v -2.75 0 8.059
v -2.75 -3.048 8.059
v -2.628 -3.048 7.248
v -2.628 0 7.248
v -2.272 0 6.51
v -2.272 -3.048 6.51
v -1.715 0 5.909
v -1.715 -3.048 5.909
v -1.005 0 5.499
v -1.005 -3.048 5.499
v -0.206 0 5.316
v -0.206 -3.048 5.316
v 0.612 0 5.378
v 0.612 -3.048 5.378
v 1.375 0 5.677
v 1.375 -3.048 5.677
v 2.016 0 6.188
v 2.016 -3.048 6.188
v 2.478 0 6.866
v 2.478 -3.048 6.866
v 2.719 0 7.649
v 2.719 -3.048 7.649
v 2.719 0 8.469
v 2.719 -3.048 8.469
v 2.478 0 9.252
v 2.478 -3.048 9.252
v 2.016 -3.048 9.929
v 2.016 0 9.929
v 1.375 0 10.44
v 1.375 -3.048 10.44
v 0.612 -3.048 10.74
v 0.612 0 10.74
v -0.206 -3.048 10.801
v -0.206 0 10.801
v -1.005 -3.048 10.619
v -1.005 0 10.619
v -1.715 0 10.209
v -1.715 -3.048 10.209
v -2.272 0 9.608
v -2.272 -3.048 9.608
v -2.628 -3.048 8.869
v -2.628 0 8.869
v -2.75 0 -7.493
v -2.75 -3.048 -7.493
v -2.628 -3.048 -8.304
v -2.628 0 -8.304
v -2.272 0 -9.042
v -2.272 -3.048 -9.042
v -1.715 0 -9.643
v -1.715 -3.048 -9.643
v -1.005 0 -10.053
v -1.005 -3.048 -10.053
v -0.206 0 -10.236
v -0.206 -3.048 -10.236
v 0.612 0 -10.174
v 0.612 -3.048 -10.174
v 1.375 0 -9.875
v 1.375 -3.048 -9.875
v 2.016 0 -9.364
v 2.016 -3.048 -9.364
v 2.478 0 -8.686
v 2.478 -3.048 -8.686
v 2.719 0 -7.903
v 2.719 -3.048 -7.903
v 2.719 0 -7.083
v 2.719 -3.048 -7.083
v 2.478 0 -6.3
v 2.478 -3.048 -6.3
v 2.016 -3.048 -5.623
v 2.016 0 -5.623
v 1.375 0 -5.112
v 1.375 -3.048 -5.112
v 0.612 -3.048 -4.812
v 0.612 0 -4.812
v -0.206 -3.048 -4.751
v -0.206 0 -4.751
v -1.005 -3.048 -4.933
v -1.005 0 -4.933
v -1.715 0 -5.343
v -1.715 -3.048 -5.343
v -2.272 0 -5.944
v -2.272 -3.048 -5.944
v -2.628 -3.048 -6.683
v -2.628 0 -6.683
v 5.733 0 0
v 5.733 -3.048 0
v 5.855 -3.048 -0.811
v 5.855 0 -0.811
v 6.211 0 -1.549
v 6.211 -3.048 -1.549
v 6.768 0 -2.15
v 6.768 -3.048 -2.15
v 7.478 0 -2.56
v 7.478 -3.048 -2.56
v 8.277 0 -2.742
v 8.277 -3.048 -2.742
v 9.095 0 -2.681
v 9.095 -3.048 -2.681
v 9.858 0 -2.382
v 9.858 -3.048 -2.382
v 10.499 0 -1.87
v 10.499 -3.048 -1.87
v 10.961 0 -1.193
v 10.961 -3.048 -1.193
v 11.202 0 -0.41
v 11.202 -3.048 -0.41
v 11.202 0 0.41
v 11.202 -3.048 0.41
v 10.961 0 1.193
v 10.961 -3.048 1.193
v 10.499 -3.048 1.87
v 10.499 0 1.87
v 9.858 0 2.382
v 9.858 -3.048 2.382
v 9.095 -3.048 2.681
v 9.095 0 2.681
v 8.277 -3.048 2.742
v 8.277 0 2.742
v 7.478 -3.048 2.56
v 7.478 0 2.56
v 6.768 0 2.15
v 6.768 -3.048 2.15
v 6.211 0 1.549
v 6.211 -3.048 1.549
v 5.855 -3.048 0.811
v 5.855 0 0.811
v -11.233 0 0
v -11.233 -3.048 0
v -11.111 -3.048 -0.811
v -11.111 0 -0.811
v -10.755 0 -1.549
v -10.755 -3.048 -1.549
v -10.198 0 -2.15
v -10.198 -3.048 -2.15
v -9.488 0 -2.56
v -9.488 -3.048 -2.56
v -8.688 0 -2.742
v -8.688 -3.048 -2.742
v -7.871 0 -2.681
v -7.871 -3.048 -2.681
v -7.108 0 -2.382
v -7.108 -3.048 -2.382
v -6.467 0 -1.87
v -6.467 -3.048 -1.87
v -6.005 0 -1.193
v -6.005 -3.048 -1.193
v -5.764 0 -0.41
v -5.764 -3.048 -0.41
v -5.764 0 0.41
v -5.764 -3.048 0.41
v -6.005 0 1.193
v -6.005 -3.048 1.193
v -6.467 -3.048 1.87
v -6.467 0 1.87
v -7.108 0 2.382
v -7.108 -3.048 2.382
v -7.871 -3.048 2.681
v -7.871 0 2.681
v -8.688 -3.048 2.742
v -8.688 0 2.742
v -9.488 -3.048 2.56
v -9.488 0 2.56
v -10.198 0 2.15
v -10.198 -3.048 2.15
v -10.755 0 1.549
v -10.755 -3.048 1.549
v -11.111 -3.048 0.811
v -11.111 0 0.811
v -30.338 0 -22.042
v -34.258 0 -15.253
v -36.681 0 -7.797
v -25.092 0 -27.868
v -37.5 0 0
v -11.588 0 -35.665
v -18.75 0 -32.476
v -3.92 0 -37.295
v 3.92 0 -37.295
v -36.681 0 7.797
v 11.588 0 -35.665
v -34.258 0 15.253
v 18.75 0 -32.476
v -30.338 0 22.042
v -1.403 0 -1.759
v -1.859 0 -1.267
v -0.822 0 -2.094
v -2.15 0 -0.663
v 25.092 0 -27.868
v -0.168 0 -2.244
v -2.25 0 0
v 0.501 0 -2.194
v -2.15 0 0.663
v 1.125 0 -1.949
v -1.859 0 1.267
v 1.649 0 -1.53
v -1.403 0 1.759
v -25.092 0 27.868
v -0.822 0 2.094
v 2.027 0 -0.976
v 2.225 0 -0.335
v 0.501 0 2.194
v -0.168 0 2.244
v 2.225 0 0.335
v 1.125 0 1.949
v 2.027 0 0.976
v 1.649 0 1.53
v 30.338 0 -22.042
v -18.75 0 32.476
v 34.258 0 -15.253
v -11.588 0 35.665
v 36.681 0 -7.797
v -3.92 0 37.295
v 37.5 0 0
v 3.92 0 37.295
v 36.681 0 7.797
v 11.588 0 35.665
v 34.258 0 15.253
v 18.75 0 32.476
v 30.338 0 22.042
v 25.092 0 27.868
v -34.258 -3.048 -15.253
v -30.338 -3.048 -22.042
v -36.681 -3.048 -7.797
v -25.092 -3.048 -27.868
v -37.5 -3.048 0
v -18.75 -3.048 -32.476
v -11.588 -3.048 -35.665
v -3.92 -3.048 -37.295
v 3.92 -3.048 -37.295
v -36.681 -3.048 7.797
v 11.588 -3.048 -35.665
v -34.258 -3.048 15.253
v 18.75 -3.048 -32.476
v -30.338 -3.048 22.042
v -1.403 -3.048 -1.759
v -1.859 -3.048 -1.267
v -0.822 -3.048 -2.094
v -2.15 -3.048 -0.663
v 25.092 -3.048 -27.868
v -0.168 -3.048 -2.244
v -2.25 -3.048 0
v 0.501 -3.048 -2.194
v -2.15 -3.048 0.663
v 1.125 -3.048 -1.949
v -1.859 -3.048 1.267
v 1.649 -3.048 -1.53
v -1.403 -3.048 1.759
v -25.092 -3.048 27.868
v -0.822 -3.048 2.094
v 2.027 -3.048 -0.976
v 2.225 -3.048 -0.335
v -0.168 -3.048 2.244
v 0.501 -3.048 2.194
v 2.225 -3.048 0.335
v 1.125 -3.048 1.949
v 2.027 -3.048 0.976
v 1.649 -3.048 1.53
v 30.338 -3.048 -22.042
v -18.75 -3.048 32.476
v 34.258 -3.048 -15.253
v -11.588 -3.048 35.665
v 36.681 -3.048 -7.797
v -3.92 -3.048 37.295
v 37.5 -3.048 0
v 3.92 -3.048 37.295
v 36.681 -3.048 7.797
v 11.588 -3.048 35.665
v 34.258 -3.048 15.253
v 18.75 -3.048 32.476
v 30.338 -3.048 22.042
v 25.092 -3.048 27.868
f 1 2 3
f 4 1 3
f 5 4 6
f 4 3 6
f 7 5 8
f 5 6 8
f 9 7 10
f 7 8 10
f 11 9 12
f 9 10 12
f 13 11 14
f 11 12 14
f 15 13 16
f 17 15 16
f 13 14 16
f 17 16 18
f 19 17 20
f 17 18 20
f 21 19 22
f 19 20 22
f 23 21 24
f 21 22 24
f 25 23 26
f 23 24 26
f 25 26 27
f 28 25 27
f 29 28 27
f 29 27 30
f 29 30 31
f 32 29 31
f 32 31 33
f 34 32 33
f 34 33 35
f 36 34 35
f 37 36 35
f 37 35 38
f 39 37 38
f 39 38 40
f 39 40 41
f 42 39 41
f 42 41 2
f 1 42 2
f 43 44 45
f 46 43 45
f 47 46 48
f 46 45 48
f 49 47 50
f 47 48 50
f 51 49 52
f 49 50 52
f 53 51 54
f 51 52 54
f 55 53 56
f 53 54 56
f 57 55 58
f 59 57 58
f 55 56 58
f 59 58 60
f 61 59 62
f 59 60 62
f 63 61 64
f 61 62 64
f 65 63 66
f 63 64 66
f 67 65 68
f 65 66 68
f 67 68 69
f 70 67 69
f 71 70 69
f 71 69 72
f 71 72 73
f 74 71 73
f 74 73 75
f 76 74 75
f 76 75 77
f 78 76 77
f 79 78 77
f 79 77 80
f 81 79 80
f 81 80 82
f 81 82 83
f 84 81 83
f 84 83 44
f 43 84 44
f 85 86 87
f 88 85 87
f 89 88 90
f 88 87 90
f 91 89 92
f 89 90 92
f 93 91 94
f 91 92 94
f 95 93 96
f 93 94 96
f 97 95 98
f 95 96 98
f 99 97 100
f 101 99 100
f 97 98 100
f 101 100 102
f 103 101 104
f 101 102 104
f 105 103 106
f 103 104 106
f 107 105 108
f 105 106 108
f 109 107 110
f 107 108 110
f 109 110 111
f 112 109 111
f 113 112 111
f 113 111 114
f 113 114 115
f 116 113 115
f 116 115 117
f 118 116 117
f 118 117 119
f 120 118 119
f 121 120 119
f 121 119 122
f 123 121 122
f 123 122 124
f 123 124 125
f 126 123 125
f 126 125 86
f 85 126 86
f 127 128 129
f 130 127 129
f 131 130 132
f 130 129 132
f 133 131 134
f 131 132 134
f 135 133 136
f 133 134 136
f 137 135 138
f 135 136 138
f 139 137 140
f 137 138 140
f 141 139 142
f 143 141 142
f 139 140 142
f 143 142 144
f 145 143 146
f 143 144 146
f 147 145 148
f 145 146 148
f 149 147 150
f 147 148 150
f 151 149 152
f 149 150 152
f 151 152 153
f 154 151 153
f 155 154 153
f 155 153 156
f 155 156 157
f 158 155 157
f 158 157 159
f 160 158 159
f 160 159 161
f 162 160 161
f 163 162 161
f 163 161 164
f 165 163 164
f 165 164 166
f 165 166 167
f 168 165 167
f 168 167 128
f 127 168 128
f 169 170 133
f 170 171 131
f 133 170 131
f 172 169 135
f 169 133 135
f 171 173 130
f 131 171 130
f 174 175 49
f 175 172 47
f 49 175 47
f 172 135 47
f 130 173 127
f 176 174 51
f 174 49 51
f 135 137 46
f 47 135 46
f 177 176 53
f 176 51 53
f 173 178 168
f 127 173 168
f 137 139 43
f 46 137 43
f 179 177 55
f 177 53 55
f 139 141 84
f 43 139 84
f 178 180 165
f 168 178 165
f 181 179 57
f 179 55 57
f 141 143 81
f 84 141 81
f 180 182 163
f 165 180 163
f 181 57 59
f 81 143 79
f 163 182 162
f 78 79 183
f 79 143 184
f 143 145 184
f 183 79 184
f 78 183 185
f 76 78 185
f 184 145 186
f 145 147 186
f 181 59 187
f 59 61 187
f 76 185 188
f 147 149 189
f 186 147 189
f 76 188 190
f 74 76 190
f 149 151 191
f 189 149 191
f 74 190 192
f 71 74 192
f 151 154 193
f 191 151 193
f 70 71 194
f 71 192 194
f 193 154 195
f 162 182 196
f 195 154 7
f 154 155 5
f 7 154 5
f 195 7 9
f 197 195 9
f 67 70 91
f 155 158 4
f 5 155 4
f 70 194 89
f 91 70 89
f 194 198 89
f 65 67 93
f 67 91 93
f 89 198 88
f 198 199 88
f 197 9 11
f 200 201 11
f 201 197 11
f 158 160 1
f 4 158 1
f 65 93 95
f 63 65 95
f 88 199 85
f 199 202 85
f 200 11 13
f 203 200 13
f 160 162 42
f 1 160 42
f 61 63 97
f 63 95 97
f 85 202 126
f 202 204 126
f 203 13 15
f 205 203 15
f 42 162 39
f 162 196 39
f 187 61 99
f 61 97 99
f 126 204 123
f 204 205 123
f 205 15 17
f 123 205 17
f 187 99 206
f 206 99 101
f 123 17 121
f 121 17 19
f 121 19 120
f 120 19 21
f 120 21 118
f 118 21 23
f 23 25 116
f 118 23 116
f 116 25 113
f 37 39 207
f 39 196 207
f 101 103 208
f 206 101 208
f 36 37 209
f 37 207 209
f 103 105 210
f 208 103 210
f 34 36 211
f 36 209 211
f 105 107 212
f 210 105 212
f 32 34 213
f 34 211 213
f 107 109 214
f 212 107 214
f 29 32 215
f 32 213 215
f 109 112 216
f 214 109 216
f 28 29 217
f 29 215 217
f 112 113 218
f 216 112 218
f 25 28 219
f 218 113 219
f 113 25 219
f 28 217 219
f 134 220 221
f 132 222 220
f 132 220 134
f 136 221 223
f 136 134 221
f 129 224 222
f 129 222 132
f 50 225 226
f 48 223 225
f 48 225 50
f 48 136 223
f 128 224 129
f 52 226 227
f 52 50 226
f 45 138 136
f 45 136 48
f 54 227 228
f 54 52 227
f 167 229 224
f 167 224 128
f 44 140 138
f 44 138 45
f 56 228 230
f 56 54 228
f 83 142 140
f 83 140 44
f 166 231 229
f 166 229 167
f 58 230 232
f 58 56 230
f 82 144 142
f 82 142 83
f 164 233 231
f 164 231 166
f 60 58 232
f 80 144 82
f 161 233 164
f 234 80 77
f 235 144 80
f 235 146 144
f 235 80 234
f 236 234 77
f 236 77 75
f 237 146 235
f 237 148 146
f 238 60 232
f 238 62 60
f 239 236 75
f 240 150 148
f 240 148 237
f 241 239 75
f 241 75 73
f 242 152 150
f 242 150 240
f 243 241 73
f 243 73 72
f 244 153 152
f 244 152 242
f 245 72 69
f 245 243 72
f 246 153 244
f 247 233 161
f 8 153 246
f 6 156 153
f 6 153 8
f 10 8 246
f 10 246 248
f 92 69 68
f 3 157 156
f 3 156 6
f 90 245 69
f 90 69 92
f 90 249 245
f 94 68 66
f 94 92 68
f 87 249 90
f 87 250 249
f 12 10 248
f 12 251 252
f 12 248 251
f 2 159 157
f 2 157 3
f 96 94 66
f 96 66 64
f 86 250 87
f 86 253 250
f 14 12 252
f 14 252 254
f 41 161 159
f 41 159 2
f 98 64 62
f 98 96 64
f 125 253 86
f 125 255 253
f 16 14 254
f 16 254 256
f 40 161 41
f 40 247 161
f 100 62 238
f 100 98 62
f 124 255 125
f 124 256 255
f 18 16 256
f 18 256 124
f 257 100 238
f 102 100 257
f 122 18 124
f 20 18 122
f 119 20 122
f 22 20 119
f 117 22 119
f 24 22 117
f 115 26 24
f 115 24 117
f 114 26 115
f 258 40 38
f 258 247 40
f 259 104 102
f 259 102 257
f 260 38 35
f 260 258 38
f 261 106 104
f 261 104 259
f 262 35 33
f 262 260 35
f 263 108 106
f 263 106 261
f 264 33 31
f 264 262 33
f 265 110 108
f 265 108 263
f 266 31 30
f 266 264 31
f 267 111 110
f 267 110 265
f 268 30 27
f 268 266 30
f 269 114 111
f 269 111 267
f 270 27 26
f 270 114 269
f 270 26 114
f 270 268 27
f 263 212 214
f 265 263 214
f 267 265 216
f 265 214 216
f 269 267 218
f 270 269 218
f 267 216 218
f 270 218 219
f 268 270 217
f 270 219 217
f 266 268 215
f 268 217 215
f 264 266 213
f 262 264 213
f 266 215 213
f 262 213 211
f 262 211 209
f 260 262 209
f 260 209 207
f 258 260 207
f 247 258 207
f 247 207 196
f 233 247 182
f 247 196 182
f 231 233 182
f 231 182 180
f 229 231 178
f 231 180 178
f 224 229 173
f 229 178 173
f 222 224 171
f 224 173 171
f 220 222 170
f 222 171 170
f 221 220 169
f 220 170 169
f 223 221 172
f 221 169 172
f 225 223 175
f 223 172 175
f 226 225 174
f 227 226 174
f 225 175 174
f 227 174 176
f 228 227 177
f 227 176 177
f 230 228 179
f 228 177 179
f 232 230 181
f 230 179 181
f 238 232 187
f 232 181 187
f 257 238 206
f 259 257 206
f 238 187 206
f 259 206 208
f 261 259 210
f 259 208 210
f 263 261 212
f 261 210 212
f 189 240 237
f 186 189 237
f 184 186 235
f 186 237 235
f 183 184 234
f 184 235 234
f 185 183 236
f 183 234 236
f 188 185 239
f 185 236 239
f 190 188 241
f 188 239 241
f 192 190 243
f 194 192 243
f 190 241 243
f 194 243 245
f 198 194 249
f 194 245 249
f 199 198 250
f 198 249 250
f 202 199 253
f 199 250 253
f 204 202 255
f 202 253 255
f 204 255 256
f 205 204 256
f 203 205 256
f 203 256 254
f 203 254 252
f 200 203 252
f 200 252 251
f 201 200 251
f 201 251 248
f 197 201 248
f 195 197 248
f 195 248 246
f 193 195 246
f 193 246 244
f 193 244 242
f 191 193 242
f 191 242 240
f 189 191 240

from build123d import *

# Parameters (mm, degrees)
F0_R     = 37.5
F1_DEPTH = 3.048
F2_D     = 4.5
F4_D     = 5.5


with BuildPart() as f1:
    # F0 (on Front) → F1 (new body)
    with BuildSketch(Plane.XZ):
        Circle(F0_R)
    extrude(amount=F1_DEPTH)

    # F2 (through all)
    with Locations(Plane(origin=(0, 0, 0), x_dir=(1, 0, 0), z_dir=(0, 1, 0))):
        with Locations((0, 0)):
            Hole(F2_D / 2)

    # F4 (through all)
    with Locations(Plane(origin=(0, 0, 0), x_dir=(1, 0, 0), z_dir=(0, 1, 0))):
        with Locations((0, -8.0587975681), (-8.4829442203, 0), (0, 7.4932677671), (8.4829442203, 0)):
            Hole(F4_D / 2)


solid = f1.part
